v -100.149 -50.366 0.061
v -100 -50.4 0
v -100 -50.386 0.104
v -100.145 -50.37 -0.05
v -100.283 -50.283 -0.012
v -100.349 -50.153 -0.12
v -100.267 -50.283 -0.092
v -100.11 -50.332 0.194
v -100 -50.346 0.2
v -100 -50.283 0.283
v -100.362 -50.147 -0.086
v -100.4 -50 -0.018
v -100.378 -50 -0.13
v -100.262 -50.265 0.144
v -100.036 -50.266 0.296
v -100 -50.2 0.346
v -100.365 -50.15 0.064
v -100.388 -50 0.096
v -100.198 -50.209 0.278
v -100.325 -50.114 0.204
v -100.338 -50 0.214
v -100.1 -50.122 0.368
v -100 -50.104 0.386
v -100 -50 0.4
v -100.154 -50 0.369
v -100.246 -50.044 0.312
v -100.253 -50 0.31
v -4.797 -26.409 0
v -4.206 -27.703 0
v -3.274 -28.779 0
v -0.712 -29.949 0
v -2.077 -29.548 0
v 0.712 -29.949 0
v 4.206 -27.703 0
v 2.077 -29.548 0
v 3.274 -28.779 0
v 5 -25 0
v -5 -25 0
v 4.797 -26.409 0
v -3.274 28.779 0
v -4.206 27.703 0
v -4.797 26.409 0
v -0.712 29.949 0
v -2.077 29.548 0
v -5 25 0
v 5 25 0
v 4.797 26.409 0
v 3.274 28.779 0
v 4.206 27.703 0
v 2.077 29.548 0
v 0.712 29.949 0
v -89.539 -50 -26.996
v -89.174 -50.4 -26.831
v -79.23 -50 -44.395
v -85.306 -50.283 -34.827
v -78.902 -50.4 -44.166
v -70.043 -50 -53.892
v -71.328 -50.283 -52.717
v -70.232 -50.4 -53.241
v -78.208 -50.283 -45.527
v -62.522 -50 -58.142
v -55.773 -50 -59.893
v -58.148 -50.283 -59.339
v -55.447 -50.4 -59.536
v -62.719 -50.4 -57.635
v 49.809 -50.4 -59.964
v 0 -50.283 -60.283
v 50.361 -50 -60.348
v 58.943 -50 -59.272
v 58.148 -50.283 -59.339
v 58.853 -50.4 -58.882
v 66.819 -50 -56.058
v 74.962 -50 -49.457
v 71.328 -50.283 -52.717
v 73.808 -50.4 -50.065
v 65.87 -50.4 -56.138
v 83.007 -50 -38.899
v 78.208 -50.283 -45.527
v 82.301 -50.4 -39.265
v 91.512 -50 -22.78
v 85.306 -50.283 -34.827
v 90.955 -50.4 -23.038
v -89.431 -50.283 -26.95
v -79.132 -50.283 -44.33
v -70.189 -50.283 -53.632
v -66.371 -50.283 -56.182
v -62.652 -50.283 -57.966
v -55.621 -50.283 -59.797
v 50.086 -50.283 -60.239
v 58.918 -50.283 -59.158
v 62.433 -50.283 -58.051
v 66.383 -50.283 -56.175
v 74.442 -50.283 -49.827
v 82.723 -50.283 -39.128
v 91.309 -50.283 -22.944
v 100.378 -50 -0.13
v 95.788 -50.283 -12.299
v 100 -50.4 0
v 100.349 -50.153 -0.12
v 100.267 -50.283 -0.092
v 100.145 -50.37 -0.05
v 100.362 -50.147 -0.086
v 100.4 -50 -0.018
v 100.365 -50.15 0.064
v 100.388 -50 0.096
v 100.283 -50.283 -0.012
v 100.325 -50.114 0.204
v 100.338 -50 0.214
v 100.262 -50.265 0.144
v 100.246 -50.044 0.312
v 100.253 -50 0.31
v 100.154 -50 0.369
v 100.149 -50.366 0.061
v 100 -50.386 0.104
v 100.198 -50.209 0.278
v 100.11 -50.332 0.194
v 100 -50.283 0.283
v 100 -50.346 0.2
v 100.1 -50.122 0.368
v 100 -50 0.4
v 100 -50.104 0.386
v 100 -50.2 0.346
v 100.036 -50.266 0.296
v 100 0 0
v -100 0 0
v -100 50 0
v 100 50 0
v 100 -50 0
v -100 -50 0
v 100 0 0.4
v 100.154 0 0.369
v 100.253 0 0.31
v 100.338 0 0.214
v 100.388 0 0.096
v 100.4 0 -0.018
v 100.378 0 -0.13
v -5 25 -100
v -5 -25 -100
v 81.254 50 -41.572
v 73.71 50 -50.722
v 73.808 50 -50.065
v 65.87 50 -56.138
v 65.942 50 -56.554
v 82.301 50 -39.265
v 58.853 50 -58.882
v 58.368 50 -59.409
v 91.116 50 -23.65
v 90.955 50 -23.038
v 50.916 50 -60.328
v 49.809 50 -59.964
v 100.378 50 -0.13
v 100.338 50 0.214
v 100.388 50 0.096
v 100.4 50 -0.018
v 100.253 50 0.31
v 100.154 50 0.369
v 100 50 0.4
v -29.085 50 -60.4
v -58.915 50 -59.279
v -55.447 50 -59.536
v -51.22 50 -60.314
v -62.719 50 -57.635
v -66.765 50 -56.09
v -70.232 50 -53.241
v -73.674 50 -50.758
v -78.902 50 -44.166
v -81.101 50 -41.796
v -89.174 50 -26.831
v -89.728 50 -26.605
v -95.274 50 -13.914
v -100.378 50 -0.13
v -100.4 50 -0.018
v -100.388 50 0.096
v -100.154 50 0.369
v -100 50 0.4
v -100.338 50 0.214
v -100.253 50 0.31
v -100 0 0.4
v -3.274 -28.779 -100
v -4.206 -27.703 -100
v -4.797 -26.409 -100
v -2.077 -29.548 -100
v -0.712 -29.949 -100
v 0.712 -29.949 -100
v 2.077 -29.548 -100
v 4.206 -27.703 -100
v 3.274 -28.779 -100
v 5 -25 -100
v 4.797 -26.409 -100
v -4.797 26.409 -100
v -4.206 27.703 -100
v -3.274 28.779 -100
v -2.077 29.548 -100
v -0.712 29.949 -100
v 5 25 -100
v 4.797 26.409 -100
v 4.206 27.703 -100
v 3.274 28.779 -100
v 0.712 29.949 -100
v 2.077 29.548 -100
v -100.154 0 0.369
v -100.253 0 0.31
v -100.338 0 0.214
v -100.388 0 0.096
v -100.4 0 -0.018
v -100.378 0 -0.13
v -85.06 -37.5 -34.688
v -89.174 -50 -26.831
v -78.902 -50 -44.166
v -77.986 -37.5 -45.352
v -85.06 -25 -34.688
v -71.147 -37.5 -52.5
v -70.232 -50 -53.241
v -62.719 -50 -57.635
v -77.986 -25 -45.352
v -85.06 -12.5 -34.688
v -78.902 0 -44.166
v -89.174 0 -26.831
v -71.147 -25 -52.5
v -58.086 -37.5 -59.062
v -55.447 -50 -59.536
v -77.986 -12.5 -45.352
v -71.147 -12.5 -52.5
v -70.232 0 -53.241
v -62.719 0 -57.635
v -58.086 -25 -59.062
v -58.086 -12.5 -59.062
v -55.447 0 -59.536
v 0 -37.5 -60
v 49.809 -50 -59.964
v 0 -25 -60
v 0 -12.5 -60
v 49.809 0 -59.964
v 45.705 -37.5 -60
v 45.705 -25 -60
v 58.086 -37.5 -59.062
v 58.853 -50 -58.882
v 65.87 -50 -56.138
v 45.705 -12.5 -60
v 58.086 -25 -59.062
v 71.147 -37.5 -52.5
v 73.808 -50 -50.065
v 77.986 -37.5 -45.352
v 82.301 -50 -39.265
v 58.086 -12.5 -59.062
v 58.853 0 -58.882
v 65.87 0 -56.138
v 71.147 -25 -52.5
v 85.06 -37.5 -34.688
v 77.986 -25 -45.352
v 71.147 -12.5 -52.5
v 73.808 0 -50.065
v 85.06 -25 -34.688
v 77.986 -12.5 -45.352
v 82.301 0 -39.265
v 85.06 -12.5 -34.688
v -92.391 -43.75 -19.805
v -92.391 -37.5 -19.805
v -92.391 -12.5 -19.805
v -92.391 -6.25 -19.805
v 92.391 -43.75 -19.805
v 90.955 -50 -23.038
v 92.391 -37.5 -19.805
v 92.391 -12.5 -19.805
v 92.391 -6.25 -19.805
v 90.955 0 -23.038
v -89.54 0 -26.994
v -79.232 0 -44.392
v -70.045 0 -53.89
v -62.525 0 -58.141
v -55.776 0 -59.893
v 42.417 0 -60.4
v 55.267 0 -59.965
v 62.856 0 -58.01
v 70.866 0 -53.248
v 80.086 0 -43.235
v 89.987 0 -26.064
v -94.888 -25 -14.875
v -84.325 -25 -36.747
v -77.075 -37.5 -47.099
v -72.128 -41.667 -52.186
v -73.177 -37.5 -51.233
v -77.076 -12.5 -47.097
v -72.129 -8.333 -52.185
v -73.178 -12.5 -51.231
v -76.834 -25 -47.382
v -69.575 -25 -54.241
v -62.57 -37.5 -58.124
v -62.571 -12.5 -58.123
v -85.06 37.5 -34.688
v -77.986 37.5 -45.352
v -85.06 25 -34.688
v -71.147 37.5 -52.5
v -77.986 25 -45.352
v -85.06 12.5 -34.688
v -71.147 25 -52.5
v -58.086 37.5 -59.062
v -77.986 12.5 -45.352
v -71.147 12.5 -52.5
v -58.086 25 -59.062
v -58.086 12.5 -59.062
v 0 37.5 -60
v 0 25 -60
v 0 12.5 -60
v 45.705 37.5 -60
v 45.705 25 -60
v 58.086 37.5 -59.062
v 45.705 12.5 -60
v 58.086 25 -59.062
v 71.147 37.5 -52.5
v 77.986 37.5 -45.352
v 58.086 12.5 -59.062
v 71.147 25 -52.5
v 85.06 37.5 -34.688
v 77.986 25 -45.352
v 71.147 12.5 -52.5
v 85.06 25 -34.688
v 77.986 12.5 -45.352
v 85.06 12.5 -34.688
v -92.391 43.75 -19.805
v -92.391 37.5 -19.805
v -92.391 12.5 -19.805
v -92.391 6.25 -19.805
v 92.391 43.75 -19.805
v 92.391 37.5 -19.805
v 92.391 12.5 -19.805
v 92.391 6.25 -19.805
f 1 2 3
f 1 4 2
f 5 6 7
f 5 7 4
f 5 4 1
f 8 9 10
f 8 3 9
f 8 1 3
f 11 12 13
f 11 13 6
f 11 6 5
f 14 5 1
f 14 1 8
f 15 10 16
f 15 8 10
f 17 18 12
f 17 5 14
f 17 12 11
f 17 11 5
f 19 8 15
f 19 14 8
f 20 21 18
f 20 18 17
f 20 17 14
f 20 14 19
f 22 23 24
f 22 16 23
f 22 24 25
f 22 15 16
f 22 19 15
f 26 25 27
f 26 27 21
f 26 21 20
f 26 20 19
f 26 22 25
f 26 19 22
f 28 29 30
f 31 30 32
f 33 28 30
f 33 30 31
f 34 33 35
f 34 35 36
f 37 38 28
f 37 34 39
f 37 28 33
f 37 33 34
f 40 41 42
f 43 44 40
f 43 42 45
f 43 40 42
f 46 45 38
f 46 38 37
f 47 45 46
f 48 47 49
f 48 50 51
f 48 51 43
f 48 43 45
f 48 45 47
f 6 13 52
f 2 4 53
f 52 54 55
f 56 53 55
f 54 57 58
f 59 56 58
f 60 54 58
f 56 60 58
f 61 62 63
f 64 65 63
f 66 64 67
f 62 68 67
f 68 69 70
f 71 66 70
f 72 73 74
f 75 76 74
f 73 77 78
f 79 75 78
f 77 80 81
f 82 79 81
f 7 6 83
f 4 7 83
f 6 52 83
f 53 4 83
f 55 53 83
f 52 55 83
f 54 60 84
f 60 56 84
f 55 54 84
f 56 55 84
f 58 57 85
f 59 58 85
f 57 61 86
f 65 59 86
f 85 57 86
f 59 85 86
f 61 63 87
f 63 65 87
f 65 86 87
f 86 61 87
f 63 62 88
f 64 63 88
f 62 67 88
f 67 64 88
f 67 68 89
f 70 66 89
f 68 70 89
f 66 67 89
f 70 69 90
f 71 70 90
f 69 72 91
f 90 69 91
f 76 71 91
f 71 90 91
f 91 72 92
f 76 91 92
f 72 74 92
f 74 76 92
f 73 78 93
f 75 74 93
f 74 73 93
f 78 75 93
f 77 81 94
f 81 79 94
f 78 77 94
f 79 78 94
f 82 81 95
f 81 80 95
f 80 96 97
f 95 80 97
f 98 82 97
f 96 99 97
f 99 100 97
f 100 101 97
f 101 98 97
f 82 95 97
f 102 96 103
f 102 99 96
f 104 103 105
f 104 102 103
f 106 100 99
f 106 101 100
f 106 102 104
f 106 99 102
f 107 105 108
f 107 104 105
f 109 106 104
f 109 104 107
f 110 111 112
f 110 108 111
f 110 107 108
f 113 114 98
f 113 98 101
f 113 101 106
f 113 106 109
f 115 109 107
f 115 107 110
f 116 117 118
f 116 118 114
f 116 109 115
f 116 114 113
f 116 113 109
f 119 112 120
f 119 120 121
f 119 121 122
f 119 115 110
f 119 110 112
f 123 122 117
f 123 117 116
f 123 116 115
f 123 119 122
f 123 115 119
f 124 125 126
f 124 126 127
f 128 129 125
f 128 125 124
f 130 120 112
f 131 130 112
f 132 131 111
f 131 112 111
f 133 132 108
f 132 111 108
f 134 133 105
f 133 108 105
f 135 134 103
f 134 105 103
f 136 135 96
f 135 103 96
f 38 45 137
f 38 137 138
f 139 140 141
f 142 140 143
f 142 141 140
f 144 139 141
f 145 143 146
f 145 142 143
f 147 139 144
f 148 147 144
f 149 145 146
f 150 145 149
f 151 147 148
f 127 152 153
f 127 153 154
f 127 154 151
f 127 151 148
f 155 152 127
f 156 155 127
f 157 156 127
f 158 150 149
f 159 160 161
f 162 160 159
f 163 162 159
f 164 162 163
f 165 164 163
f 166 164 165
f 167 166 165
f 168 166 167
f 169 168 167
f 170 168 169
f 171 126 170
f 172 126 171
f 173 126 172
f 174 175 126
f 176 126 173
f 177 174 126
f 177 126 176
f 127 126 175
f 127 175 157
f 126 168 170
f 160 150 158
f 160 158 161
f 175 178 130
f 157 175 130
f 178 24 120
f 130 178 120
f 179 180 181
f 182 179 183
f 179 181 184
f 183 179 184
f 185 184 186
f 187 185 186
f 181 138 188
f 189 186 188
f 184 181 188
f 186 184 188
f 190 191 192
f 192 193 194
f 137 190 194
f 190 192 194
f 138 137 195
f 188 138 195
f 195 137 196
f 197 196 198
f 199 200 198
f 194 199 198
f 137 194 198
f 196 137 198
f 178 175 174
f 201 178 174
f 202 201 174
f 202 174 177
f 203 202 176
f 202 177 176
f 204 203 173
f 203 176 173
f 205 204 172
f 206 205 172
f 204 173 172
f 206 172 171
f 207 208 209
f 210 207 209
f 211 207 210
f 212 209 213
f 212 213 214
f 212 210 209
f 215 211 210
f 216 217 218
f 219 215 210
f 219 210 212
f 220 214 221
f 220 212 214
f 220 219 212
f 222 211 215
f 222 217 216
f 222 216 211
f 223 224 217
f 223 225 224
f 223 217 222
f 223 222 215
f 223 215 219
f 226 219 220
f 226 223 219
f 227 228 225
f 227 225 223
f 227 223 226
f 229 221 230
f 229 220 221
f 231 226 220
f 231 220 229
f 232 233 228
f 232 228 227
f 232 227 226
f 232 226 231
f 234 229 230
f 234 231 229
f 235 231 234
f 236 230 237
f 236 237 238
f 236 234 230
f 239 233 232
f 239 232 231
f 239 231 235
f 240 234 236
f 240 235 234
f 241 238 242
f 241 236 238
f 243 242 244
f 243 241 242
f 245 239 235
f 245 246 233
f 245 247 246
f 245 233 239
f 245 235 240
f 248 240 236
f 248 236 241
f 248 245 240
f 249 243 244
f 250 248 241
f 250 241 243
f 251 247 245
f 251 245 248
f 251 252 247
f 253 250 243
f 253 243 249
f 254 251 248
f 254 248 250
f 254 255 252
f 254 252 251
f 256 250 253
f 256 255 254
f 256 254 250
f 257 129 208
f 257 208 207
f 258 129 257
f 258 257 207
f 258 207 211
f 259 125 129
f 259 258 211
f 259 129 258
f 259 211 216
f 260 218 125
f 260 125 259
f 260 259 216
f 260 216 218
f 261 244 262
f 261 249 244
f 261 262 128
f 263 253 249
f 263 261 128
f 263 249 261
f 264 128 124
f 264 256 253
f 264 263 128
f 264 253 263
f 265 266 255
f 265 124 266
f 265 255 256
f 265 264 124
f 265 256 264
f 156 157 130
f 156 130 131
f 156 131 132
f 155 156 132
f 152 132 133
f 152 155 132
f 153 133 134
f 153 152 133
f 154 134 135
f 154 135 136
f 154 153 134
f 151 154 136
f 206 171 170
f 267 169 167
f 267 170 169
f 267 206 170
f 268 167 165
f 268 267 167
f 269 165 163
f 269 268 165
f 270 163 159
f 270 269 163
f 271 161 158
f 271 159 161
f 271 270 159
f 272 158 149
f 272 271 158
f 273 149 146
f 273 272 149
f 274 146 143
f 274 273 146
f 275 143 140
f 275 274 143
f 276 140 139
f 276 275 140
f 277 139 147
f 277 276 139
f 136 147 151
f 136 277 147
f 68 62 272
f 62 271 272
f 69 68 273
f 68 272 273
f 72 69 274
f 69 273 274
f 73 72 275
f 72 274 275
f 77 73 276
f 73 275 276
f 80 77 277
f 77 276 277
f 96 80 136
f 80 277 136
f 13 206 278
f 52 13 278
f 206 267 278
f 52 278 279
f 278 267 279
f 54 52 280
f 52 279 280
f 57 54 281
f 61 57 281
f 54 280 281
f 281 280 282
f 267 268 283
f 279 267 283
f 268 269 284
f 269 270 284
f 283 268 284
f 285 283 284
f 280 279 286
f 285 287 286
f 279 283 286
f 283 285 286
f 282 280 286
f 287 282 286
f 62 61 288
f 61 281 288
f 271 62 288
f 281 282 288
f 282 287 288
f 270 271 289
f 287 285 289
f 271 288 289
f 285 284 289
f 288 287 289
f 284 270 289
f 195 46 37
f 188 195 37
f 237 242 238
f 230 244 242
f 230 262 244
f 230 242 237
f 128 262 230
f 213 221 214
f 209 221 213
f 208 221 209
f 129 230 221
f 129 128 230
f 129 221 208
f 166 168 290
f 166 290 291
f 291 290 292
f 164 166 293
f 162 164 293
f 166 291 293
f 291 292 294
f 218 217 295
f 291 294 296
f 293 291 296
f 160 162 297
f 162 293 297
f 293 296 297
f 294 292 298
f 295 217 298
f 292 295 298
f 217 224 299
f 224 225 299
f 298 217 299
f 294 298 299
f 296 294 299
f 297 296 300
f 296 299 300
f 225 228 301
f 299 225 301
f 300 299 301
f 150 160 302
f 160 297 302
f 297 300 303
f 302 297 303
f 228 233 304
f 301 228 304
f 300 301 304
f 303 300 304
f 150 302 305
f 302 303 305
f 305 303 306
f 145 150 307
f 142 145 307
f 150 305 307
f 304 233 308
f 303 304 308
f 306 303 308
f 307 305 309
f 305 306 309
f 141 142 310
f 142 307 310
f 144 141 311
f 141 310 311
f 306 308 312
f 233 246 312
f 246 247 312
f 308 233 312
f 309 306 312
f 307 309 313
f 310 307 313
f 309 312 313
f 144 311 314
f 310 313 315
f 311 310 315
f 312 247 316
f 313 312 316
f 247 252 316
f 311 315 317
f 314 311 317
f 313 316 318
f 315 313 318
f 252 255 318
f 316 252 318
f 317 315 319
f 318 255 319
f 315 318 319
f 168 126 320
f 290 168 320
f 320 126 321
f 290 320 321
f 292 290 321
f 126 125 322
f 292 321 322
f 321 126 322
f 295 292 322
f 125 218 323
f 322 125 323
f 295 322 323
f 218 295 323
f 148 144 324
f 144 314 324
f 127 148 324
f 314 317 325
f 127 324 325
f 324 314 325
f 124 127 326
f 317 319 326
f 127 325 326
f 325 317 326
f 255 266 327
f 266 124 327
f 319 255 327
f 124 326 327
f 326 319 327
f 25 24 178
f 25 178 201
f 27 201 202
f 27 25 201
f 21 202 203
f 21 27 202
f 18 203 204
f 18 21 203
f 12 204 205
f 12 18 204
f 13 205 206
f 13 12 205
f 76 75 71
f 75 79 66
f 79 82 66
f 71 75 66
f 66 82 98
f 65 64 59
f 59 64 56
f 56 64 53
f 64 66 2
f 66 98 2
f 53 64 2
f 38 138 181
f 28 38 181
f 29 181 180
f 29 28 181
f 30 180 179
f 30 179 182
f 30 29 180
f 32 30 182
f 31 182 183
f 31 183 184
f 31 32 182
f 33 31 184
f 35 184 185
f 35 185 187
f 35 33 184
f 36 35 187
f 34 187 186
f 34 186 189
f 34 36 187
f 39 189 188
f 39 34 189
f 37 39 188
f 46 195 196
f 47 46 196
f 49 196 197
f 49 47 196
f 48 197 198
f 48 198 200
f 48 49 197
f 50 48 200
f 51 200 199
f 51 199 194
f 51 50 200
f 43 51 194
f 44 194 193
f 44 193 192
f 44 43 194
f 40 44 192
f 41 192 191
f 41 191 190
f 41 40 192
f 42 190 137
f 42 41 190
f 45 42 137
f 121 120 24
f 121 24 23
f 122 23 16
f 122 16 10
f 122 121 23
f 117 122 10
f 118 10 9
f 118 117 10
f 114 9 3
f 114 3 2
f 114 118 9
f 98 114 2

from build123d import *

# Parameters (mm, degrees)
PAD_DEPTH    = 50
THICKNESS_T  = 0.4
PAD001_DEPTH = 100


with BuildPart() as hull:
    # Sketch003 → Pad (new body, symmetric)
    with BuildSketch(Plane.XZ):
        with BuildLine():
            Line((-100, 0), (100, 0))
            add(Edge.make_bspline(
                [(-100, 0), (-79.318541, -60), (-44.357747, -60), (0, -60), (44.357747, -60), (79.318541, -60), (100, 0)],
                knots=[0, 0, 0, 0, 0.25, 0.5, 0.75, 1, 1, 1, 1], degree=3))
        make_face()
    extrude(amount=PAD_DEPTH, both=True)

    # Thickness
    thickness_openings = [hull.faces().sort_by_distance(p)[0] for p in [
        (0, 50, -27.855645),
    ]]
    offset(amount=THICKNESS_T, openings=thickness_openings)


with BuildPart() as keel_slot:
    # Sketch002 → Pad001 (new body)
    with BuildSketch(Plane.XY):
        with BuildLine():
            ThreePointArc((5, 25), (0, 30), (-5, 25))
            Line((-5, 25), (-5, -25))
            ThreePointArc((-5, -25), (0, -30), (5, -25))
            Line((5, 25), (5, -25))
        make_face()
    extrude(amount=-PAD001_DEPTH)


solid = Compound([hull.part, keel_slot.part])
